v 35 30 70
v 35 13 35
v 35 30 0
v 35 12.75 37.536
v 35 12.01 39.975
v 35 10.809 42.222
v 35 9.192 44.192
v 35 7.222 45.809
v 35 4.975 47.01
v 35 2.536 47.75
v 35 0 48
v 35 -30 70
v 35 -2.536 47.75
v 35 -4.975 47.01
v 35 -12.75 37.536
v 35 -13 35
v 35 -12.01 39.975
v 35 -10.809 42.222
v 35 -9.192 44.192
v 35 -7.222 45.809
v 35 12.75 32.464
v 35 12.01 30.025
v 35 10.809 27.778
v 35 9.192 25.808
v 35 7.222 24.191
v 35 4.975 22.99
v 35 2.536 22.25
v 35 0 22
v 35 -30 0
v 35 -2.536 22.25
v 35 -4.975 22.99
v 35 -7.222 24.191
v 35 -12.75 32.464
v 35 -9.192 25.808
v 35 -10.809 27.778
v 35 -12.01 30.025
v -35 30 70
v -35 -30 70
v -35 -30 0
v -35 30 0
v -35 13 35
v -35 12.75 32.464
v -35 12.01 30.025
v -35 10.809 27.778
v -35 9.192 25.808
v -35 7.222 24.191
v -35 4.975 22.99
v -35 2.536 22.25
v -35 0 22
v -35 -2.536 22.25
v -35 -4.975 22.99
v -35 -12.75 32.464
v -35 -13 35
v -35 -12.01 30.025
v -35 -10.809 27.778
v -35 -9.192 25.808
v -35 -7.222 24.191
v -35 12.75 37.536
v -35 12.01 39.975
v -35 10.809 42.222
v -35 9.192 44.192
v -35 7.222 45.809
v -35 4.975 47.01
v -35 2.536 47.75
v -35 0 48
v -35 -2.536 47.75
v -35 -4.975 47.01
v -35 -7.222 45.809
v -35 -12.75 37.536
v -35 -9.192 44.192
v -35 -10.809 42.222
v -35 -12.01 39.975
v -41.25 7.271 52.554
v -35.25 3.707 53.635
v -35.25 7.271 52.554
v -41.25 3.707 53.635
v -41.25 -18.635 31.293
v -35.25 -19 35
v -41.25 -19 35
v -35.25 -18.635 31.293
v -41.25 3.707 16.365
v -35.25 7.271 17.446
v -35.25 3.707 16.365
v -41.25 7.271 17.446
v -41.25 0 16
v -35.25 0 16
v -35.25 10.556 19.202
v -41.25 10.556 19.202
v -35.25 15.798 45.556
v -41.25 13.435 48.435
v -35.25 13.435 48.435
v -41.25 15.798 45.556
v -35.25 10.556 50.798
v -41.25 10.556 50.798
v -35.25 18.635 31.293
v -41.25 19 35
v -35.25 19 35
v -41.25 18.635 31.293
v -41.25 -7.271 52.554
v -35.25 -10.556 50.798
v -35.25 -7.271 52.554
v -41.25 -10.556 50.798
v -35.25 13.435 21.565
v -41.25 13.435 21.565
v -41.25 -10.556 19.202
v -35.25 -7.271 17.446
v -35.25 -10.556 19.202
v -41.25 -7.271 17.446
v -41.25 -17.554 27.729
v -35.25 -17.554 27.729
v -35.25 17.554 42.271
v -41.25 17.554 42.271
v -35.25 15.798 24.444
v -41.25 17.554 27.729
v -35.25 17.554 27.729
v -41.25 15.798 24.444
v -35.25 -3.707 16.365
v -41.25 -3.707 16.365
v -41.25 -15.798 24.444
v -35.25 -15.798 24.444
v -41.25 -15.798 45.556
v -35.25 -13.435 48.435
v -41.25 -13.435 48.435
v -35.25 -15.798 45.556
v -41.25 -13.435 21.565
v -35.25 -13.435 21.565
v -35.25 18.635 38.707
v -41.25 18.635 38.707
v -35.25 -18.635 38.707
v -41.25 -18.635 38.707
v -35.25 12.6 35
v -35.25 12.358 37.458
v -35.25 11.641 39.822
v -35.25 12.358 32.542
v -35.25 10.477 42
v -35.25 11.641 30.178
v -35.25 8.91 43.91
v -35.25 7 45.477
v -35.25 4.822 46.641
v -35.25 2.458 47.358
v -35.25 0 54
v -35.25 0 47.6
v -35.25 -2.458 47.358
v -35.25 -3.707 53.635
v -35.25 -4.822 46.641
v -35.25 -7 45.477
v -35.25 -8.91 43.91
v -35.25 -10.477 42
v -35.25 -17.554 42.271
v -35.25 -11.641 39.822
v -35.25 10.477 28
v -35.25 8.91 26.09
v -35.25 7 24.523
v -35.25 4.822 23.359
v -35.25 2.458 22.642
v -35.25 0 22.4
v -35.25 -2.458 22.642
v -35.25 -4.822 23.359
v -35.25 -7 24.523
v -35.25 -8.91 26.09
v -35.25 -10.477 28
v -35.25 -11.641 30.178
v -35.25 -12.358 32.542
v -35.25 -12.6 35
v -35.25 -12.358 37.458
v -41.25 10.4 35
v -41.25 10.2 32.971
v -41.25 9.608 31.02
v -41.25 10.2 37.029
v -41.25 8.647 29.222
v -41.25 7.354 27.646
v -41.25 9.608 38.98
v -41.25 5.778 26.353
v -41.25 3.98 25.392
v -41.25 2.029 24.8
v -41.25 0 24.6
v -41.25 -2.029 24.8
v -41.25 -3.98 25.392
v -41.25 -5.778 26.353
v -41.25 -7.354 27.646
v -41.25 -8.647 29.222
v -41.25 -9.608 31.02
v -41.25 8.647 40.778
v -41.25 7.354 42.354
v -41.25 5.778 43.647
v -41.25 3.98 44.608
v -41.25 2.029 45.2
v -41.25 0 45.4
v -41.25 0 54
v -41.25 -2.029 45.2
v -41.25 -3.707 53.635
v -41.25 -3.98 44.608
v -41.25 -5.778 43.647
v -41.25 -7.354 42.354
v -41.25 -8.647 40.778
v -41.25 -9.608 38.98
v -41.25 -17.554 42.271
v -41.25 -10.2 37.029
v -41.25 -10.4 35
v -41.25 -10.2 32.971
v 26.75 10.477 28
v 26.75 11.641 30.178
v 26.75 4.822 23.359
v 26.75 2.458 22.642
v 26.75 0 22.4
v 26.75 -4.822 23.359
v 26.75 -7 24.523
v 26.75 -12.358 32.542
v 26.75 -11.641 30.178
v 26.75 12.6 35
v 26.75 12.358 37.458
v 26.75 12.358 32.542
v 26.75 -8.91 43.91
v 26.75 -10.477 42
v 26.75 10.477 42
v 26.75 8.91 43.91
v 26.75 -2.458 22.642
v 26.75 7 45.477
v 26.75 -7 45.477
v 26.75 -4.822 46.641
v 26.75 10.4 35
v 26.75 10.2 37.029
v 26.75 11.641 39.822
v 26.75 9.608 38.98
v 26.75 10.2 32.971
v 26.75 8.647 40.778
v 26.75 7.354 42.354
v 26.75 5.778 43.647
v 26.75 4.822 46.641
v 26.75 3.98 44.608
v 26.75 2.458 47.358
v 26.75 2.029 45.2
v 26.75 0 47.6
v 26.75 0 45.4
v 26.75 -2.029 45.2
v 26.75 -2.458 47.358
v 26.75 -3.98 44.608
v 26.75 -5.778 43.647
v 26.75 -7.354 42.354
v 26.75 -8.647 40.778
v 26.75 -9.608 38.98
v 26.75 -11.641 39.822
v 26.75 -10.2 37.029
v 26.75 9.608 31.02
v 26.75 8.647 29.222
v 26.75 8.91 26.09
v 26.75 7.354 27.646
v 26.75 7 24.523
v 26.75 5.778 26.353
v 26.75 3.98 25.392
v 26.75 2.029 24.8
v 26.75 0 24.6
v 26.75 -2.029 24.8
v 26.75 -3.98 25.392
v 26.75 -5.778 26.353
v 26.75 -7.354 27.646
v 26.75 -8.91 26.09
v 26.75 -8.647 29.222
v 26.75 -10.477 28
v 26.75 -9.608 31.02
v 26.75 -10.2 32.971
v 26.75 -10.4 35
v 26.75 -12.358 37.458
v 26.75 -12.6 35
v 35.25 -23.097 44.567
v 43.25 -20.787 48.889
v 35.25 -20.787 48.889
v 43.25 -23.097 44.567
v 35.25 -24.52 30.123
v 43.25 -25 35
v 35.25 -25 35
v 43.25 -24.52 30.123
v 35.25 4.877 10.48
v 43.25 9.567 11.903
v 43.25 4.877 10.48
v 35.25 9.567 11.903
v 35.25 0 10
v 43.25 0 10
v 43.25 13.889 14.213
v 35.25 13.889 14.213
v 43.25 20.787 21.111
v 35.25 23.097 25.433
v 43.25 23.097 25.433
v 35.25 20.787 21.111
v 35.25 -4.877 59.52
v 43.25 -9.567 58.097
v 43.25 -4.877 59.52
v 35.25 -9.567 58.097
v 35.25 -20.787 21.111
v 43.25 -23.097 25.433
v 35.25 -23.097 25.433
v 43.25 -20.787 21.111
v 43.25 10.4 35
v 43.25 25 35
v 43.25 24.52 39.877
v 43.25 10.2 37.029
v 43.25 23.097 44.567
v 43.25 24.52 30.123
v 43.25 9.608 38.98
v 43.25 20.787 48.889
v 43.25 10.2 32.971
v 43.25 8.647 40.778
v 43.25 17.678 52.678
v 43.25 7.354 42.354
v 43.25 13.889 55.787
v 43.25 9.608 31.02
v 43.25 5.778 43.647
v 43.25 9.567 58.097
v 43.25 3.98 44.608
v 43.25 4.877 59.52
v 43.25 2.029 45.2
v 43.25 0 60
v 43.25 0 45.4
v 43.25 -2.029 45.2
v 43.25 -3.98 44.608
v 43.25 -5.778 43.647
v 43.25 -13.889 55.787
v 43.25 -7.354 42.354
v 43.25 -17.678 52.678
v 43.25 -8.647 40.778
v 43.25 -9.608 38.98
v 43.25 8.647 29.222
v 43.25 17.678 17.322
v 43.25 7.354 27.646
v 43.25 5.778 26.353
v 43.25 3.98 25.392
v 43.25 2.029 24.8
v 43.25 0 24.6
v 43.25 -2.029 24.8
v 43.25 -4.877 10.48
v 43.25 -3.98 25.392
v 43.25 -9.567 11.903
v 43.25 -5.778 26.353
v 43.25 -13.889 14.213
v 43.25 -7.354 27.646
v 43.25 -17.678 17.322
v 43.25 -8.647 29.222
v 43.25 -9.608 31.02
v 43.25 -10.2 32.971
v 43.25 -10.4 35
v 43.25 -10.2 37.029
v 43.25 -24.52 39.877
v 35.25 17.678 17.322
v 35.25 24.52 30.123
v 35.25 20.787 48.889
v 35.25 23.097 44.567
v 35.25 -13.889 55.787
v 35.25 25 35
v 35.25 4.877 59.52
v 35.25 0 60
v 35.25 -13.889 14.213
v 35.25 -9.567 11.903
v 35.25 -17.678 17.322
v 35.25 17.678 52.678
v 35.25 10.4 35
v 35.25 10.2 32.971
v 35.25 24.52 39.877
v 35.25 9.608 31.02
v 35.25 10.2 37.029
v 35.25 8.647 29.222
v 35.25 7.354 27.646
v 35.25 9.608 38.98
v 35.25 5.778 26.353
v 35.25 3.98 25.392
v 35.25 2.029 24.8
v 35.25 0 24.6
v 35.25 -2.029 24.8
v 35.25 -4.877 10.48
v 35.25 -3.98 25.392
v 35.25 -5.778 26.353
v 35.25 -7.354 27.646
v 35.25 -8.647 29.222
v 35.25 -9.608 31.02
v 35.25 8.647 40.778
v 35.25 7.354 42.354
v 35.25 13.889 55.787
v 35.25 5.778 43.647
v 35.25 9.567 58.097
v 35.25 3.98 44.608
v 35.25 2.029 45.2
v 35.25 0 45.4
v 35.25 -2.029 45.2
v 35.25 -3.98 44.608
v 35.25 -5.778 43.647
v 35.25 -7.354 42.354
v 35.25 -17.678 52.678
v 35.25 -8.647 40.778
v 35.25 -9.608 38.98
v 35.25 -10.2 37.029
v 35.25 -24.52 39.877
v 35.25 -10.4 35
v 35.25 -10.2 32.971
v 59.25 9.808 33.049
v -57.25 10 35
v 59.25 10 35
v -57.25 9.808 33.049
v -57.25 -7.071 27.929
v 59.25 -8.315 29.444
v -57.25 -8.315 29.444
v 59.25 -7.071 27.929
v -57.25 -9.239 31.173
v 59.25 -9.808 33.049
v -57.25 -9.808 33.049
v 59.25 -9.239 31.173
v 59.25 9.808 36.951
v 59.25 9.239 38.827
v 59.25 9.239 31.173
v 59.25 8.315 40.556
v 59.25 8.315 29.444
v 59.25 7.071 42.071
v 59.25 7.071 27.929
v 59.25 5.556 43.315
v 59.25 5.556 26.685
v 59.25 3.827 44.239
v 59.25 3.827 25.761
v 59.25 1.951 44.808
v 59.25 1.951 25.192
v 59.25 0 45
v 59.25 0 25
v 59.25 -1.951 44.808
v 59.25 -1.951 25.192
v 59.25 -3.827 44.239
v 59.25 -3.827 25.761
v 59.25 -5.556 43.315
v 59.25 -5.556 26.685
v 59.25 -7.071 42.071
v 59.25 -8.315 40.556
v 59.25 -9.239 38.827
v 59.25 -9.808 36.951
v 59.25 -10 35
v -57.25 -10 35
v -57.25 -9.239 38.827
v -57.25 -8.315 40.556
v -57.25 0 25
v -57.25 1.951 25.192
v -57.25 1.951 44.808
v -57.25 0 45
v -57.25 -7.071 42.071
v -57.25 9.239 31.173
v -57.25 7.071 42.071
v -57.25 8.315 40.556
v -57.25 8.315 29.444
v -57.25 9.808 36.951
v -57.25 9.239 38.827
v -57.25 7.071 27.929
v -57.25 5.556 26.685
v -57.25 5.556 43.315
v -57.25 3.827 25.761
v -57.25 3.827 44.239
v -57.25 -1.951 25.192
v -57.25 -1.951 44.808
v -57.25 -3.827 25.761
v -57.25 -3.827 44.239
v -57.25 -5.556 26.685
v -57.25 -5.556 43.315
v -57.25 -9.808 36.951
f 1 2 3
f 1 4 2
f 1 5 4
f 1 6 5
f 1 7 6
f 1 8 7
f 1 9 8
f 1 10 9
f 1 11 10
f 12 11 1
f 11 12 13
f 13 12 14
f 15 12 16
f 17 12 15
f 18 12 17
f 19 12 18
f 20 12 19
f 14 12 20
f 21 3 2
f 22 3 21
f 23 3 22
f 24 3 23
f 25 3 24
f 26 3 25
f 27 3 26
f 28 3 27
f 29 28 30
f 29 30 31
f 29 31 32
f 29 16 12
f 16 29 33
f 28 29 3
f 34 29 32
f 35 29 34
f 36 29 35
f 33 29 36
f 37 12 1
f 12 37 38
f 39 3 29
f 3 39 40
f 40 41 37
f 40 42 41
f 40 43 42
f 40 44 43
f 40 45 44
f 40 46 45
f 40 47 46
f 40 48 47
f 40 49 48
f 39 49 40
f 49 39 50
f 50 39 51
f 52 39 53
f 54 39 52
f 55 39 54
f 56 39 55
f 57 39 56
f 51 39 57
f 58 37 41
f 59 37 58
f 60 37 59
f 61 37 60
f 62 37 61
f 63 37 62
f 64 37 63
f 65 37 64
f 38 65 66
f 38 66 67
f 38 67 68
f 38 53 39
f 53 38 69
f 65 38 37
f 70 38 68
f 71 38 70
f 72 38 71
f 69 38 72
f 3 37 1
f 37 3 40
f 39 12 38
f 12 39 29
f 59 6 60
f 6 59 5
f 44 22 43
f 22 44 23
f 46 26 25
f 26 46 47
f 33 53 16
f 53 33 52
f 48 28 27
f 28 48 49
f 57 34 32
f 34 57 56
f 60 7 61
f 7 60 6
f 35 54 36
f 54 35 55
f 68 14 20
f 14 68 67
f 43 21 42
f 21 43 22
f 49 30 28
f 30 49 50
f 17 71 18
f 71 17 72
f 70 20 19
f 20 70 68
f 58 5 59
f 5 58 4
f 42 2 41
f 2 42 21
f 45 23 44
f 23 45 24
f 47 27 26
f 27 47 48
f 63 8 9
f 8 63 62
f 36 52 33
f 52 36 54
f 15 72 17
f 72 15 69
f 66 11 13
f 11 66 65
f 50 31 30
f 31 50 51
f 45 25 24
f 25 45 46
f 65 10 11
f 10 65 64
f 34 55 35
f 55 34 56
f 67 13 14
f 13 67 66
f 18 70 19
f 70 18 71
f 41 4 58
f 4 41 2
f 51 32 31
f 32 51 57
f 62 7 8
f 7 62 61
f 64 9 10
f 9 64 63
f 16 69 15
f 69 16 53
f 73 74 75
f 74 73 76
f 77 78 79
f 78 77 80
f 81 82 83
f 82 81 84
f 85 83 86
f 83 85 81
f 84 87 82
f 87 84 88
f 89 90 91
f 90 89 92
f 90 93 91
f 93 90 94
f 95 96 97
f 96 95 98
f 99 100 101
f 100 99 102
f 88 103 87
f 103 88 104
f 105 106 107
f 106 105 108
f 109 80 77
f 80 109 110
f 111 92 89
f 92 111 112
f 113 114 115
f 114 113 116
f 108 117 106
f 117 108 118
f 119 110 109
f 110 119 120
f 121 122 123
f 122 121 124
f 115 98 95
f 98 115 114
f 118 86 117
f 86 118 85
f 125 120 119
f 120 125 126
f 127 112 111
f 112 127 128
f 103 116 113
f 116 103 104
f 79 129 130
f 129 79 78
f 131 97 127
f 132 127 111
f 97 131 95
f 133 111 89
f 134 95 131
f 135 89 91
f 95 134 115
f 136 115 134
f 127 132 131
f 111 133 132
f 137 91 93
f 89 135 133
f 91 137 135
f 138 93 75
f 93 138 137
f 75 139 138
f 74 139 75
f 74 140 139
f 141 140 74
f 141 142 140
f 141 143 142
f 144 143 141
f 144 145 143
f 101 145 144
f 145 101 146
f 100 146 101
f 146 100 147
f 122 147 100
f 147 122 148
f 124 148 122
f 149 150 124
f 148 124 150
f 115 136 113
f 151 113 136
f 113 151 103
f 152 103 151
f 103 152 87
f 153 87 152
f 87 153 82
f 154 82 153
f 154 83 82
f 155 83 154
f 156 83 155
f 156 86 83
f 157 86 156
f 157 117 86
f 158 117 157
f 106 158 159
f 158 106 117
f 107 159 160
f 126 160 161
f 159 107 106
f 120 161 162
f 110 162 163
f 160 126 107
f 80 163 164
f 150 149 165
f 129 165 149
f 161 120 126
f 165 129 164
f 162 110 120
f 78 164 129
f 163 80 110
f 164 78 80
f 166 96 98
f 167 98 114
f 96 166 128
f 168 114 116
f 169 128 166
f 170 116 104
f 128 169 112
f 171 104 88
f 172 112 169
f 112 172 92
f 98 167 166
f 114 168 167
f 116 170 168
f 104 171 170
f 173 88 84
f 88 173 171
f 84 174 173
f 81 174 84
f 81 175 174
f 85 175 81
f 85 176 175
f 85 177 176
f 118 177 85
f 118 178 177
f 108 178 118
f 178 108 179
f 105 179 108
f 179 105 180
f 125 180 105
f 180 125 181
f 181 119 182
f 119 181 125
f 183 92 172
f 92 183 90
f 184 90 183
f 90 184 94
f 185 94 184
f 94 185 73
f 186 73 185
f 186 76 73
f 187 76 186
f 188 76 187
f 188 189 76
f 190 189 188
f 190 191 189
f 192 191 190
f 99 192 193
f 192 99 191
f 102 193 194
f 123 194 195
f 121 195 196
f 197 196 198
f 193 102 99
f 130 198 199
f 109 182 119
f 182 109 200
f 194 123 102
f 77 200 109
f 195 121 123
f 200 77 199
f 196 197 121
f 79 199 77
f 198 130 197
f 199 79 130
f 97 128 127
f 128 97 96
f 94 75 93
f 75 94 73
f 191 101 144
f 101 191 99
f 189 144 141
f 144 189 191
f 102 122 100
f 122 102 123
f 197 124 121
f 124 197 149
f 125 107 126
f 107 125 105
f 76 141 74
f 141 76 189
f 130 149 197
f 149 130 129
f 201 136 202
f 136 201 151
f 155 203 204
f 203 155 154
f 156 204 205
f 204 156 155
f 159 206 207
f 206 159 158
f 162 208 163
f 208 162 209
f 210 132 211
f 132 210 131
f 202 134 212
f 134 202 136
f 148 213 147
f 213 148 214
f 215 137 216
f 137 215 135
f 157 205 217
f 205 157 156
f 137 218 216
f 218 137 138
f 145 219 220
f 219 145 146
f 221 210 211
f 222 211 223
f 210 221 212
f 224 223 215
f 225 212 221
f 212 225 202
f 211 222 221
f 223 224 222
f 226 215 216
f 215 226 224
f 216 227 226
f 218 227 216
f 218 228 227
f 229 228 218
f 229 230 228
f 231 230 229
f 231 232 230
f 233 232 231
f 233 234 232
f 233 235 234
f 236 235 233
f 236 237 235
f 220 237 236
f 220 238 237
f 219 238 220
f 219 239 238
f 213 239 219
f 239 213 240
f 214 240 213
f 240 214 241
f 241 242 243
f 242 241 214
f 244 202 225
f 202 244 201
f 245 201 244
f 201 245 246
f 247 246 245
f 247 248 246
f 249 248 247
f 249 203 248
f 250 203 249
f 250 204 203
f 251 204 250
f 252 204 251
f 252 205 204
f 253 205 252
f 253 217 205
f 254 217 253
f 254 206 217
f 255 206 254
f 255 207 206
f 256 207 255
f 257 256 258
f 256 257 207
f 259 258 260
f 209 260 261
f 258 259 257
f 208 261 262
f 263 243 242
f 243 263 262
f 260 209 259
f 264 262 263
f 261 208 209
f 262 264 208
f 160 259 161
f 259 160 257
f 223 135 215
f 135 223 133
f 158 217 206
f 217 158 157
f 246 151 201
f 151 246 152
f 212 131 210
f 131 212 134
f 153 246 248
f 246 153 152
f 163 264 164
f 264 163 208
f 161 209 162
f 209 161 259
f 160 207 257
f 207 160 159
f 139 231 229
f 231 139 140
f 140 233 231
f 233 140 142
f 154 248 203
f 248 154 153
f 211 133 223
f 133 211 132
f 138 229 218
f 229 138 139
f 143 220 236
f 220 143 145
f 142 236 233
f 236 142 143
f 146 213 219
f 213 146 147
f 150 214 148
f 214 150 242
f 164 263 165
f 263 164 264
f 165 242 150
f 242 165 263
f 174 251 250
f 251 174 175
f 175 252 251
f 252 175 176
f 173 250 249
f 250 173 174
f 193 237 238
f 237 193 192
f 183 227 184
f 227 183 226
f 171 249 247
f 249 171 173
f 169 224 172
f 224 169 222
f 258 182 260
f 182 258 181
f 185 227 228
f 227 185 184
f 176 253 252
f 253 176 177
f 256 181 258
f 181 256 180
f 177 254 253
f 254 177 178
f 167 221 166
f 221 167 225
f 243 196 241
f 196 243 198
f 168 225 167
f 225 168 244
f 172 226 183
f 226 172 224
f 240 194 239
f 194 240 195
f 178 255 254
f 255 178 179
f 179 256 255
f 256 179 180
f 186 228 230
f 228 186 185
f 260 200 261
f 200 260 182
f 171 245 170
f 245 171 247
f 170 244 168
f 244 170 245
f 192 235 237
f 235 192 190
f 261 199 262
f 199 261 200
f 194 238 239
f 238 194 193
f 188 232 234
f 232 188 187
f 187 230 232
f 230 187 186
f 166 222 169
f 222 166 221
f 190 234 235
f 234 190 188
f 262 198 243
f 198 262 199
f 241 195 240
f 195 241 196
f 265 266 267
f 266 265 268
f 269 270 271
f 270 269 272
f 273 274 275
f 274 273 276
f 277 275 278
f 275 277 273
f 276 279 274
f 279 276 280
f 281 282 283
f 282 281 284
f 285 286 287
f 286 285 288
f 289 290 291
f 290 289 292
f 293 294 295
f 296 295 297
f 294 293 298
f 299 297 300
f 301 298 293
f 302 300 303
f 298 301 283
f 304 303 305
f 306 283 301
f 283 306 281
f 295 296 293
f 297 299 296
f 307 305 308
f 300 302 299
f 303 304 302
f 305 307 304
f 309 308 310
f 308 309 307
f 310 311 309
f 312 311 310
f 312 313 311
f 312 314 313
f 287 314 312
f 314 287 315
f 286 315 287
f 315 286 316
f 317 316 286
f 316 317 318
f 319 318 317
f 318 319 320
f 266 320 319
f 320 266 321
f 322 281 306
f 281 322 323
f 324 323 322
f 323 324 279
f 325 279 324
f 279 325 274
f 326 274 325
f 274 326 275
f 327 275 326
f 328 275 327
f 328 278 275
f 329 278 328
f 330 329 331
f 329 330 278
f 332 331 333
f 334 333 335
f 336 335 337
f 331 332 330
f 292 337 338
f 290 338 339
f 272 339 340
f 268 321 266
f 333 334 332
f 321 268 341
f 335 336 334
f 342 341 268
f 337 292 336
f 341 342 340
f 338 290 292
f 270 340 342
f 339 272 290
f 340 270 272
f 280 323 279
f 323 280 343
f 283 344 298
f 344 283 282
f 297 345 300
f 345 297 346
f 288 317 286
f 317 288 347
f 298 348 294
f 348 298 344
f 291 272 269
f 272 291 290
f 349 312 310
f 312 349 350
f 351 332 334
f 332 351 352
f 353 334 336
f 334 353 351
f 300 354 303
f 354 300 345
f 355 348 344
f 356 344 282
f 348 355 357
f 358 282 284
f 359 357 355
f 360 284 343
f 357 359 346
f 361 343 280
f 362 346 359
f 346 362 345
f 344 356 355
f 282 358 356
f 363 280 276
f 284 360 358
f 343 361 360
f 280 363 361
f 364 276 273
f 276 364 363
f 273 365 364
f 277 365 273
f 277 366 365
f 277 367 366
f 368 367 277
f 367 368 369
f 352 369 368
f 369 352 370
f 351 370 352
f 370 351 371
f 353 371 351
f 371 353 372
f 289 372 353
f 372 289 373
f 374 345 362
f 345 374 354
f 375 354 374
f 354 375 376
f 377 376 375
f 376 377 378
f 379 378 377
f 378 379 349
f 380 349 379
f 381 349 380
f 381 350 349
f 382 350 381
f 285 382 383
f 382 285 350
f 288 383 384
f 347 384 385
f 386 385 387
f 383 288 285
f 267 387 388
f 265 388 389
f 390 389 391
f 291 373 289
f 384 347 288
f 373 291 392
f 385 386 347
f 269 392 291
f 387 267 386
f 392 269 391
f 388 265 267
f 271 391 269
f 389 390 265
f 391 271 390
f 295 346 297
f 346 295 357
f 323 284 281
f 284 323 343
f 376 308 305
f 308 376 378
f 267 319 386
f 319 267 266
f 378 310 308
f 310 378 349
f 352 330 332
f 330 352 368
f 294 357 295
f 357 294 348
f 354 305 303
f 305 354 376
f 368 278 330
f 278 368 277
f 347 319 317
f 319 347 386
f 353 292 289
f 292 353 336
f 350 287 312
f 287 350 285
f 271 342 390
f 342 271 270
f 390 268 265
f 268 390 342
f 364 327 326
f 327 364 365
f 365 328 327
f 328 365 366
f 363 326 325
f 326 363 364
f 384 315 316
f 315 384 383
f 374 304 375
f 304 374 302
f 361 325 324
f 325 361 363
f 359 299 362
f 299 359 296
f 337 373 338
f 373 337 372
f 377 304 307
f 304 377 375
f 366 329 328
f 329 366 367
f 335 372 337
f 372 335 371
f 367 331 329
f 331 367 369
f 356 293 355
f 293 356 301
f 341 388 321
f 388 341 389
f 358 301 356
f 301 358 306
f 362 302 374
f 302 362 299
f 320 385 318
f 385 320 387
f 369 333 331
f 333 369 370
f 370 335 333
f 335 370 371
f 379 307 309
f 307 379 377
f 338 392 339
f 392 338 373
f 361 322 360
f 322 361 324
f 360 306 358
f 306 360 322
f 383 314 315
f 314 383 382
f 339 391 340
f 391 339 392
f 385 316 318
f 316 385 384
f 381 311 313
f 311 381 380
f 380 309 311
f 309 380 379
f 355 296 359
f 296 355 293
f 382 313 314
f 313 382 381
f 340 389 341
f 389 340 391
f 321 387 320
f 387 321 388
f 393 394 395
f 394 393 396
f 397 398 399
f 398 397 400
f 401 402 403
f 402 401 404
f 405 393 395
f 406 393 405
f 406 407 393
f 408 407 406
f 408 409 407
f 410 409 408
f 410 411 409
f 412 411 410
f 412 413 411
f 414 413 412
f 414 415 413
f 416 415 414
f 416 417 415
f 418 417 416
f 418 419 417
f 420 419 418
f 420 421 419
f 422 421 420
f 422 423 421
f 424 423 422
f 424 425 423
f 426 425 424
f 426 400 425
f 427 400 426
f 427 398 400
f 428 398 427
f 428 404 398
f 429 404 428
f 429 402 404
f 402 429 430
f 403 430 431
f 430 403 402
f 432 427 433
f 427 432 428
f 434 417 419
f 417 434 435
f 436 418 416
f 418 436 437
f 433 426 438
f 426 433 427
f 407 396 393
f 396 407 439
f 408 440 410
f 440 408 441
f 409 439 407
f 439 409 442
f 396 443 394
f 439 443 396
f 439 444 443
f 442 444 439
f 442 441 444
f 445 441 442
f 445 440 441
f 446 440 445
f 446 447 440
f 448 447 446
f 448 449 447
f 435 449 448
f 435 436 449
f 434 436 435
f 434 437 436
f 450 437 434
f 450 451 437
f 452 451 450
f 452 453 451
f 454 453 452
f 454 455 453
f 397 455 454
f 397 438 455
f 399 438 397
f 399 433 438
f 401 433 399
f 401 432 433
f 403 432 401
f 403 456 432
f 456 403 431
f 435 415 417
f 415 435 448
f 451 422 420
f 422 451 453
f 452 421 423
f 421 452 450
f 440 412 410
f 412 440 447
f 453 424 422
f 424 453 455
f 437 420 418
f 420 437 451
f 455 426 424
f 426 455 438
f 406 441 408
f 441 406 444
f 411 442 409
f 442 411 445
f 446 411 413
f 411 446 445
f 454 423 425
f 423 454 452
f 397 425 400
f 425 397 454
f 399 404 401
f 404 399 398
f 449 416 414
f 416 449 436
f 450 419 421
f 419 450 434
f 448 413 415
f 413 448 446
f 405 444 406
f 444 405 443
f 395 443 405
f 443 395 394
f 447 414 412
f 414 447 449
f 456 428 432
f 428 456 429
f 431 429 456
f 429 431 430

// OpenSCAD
$fn = 32;

// ------------------------------------------------------------------------
// Bushed housing: 70 x 60 x 70 mm housing, bushing d25.2
// Every part is its own module, assembly() places them once.
// ------------------------------------------------------------------------

// --- part 1 ---
module housing() {
  difference() {
    translate([-35, -30, 0]) cube([70, 60, 70]);
    translate([0, 0, 35]) rotate([0, 90, 0]) cylinder(h = 72, d = 26, center = true);
  }
}

// --- part 2 ---
module bushing() {
  difference() {
    union() {
      cylinder(h = 6, d = 38);
      translate([0, 0, 6]) cylinder(h = 62, d = 25.2);
    }
    translate([0, 0, -1]) cylinder(h = 70, d = 20.8);
  }
}

// --- part 3 ---
module shaft() {
  translate([0, 0, -58.25]) cylinder(h = 116.5, d = 20);
}

// --- part 4 ---
module cover() {
  difference() {
    cylinder(h = 8, d = 50);
    translate([0, 0, -1]) cylinder(h = 10, d = 20.8);
  }
}

// --- assembly ---
module assembly() {
  translate([0, 0, 0]) rotate([0, 0, 0]) housing();
  translate([-41.25, 0, 35]) rotate([0, 90, 0]) bushing();
  translate([1, 0, 35]) rotate([0, 90, 0]) shaft();
  translate([35.25, 0, 35]) rotate([0, 90, 0]) cover();
}

assembly();
